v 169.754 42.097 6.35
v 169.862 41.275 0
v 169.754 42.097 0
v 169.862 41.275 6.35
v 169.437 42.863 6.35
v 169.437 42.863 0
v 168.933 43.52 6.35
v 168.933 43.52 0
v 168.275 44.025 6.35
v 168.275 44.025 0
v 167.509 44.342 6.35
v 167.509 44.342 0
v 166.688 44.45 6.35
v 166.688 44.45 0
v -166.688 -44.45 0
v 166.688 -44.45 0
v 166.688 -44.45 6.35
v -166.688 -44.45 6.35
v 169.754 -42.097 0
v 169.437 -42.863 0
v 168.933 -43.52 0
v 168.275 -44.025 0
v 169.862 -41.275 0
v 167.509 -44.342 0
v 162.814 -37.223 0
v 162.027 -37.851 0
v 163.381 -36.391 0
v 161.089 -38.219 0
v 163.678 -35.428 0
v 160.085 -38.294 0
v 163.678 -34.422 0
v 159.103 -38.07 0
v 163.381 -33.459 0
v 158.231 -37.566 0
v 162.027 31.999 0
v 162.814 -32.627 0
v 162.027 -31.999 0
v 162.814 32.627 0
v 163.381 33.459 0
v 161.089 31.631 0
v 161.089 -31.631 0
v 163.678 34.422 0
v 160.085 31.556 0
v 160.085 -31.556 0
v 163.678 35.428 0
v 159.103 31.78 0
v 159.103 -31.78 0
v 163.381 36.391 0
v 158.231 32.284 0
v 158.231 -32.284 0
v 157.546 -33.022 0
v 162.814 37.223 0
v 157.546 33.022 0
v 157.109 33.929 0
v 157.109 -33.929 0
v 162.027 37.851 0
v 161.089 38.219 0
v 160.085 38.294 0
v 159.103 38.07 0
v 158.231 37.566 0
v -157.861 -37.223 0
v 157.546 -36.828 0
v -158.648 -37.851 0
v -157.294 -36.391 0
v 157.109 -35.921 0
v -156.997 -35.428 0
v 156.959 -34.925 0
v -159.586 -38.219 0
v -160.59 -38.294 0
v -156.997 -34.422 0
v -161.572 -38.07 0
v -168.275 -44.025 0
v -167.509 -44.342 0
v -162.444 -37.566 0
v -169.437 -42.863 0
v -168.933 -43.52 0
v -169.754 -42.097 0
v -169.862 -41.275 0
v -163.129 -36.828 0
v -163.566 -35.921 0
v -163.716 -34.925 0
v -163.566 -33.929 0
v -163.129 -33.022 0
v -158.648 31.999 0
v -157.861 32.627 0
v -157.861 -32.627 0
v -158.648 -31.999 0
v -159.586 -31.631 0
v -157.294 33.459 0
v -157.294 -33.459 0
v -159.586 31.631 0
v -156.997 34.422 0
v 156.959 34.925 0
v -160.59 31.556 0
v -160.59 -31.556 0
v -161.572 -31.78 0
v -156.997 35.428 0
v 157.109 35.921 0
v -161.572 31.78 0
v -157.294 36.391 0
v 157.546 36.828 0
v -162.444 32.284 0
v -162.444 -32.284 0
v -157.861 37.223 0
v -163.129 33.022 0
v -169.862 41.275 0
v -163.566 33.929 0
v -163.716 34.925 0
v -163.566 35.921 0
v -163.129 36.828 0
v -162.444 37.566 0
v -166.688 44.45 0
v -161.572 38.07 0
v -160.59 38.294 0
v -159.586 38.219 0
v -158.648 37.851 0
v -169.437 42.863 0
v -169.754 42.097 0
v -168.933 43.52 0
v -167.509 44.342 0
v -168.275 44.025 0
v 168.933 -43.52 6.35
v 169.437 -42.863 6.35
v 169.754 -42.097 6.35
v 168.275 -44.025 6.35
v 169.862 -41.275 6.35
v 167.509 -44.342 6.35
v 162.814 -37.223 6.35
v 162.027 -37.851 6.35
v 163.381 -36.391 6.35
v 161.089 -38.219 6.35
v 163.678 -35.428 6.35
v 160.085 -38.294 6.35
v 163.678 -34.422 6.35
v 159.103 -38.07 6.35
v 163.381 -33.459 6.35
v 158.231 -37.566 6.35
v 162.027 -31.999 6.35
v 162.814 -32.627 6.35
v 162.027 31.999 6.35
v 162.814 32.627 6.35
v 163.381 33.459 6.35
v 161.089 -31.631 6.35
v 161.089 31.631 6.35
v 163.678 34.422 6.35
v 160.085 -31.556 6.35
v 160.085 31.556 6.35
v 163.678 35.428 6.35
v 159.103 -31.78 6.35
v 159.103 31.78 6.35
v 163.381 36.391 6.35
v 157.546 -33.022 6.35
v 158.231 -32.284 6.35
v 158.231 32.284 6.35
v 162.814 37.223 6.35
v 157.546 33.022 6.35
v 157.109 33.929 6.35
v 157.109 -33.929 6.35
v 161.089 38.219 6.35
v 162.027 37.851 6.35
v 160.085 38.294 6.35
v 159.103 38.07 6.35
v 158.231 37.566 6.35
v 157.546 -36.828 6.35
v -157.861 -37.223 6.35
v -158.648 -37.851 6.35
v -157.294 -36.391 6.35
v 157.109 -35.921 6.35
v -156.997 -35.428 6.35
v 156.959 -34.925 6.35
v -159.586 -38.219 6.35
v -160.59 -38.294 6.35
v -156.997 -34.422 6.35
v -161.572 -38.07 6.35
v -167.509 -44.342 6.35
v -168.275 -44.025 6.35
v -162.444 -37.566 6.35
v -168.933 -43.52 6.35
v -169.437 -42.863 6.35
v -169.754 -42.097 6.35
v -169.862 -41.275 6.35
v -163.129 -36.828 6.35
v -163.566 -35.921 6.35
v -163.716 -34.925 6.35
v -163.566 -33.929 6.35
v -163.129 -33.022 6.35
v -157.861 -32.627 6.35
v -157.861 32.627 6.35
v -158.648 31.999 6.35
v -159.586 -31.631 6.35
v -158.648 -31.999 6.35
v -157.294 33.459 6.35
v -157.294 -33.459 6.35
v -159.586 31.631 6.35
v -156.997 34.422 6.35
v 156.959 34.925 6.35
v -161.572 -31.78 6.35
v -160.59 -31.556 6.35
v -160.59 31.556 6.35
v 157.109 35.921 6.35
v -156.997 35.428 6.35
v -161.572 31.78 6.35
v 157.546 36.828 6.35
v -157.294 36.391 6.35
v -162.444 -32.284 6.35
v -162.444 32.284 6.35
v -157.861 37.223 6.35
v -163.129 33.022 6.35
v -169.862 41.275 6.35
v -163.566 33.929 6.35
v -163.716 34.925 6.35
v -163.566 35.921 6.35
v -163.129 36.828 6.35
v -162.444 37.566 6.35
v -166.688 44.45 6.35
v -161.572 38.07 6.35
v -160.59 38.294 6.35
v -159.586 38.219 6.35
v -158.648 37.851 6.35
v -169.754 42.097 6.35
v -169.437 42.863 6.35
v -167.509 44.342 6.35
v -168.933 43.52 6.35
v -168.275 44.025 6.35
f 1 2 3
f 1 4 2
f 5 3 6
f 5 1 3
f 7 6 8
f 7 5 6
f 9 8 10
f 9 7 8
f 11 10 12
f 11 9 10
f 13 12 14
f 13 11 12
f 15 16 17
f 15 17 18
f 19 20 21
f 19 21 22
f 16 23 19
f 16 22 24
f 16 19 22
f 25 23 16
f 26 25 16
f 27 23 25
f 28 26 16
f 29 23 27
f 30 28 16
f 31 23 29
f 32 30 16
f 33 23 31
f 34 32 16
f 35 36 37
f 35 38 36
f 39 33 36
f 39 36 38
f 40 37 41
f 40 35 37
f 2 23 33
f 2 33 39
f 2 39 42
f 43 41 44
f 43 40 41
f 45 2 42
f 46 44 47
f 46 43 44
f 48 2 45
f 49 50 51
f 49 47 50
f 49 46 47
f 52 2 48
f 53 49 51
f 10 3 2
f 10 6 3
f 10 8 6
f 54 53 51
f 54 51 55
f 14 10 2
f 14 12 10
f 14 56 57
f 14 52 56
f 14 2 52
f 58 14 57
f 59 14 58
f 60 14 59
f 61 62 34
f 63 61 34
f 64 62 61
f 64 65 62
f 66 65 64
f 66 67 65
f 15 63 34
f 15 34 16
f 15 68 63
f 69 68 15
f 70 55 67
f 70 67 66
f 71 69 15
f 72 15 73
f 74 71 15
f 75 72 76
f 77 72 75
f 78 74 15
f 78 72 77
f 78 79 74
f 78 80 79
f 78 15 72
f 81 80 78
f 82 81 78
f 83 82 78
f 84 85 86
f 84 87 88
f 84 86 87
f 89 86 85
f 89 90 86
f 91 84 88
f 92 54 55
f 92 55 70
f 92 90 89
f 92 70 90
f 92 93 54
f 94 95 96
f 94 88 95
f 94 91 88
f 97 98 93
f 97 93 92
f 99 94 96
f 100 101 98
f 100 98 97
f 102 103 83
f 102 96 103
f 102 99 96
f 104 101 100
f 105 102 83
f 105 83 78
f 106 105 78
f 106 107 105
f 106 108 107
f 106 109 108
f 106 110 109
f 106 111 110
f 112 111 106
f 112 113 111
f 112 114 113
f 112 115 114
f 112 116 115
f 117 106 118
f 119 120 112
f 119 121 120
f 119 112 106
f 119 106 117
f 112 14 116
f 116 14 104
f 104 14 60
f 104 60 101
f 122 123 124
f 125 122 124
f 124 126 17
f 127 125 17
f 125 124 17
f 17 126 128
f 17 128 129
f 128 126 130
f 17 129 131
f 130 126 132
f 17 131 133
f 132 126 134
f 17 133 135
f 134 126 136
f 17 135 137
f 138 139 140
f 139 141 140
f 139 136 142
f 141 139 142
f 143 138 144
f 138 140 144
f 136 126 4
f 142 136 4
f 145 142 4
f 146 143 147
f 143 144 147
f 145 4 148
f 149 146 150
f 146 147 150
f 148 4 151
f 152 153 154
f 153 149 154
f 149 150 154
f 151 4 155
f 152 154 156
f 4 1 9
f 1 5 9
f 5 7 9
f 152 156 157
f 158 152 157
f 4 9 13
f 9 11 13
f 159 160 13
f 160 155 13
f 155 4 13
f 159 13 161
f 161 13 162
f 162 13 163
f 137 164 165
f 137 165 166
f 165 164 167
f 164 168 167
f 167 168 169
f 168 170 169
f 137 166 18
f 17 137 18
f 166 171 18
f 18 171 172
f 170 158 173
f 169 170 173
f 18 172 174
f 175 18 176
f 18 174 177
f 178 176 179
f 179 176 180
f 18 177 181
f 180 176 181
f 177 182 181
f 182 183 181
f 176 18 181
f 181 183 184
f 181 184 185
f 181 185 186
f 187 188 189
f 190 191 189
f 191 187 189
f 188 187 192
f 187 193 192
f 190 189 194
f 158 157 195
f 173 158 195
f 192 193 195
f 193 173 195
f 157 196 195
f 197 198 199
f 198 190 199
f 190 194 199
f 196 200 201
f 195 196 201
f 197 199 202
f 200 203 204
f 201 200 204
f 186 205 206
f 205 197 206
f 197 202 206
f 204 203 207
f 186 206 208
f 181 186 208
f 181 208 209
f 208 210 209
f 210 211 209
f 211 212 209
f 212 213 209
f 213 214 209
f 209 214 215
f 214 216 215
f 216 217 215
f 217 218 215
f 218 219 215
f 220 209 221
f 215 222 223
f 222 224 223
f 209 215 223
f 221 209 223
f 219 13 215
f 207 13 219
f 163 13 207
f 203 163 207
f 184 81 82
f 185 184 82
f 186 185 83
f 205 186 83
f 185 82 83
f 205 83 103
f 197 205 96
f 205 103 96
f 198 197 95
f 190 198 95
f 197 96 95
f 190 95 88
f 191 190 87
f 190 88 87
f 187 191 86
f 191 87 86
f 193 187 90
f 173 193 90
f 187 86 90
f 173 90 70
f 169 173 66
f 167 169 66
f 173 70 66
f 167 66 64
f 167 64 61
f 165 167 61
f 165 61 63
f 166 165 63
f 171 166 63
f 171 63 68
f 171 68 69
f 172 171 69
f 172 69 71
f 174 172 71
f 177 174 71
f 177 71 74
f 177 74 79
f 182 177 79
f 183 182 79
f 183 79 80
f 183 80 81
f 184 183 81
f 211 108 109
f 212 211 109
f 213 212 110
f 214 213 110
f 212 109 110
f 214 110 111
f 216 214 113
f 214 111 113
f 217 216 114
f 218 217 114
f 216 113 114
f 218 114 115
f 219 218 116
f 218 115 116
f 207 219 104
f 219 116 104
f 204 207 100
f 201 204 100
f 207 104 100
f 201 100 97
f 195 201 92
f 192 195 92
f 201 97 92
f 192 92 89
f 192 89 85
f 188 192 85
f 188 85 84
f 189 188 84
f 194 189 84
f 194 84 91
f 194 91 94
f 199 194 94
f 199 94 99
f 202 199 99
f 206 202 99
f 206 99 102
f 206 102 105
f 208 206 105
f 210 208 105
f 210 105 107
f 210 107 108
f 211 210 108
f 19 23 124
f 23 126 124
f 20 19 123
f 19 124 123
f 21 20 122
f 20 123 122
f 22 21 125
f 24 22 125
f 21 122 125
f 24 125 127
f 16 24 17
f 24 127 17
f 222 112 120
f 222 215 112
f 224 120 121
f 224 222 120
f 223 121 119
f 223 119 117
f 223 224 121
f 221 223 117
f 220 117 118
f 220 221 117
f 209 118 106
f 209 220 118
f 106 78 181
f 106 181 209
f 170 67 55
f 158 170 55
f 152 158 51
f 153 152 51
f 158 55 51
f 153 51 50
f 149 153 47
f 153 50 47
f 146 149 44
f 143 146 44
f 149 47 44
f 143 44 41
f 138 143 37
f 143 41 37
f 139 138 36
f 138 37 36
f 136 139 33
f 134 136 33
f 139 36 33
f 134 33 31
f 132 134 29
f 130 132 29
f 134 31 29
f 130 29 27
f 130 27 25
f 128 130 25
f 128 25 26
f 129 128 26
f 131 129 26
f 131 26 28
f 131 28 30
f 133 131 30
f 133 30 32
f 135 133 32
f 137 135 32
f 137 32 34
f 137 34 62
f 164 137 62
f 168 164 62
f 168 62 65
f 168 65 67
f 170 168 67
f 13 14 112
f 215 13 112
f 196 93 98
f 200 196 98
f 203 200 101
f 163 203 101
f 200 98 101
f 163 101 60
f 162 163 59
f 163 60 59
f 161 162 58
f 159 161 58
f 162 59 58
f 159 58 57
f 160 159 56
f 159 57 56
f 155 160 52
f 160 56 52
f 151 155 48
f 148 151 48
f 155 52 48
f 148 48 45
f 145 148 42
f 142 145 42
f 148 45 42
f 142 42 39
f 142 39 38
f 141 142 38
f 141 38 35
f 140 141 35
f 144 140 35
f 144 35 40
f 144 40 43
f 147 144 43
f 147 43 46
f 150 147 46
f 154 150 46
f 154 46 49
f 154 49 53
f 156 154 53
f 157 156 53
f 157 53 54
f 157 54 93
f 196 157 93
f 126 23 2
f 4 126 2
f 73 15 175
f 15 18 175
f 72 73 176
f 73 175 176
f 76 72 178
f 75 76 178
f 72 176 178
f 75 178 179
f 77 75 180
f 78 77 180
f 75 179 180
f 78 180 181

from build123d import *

# Parameters (mm, degrees)
SKETCH1_W               = 339.725
SKETCH1_H               = 88.9
BOSS_EXTRUDE1_DEPTH     = 6.35
F_1_4_CLEARANCE_HOLE1_D = 6.7564
FILLET1_R               = 3.175


with BuildPart() as part:
    # Sketch1 → Boss-Extrude1 (new body)
    with BuildSketch(Plane(origin=(0, 0, 0), x_dir=(-1, 0, 0), z_dir=(0, 0, -1))):
        Rectangle(SKETCH1_W, SKETCH1_H)
    extrude(amount=-BOSS_EXTRUDE1_DEPTH)

    # 1/4 Clearance Hole1 (through all)
    with Locations(Plane.XY.offset(6.35)):
        with Locations((-160.3375, 34.925), (-160.3375, -34.925), (160.3375, 34.925), (160.3375, -34.925)):
            Hole(F_1_4_CLEARANCE_HOLE1_D / 2)

    # Fillet1
    fillet1_edges = [part.edges().sort_by_distance(p)[0] for p in [
        (169.8625, 44.45, 3.175),
        (-169.8625, 44.45, 3.175),
        (-169.8625, -44.45, 3.175),
        (169.8625, -44.45, 3.175),
    ]]
    fillet(fillet1_edges, radius=FILLET1_R)


solid = part.part
